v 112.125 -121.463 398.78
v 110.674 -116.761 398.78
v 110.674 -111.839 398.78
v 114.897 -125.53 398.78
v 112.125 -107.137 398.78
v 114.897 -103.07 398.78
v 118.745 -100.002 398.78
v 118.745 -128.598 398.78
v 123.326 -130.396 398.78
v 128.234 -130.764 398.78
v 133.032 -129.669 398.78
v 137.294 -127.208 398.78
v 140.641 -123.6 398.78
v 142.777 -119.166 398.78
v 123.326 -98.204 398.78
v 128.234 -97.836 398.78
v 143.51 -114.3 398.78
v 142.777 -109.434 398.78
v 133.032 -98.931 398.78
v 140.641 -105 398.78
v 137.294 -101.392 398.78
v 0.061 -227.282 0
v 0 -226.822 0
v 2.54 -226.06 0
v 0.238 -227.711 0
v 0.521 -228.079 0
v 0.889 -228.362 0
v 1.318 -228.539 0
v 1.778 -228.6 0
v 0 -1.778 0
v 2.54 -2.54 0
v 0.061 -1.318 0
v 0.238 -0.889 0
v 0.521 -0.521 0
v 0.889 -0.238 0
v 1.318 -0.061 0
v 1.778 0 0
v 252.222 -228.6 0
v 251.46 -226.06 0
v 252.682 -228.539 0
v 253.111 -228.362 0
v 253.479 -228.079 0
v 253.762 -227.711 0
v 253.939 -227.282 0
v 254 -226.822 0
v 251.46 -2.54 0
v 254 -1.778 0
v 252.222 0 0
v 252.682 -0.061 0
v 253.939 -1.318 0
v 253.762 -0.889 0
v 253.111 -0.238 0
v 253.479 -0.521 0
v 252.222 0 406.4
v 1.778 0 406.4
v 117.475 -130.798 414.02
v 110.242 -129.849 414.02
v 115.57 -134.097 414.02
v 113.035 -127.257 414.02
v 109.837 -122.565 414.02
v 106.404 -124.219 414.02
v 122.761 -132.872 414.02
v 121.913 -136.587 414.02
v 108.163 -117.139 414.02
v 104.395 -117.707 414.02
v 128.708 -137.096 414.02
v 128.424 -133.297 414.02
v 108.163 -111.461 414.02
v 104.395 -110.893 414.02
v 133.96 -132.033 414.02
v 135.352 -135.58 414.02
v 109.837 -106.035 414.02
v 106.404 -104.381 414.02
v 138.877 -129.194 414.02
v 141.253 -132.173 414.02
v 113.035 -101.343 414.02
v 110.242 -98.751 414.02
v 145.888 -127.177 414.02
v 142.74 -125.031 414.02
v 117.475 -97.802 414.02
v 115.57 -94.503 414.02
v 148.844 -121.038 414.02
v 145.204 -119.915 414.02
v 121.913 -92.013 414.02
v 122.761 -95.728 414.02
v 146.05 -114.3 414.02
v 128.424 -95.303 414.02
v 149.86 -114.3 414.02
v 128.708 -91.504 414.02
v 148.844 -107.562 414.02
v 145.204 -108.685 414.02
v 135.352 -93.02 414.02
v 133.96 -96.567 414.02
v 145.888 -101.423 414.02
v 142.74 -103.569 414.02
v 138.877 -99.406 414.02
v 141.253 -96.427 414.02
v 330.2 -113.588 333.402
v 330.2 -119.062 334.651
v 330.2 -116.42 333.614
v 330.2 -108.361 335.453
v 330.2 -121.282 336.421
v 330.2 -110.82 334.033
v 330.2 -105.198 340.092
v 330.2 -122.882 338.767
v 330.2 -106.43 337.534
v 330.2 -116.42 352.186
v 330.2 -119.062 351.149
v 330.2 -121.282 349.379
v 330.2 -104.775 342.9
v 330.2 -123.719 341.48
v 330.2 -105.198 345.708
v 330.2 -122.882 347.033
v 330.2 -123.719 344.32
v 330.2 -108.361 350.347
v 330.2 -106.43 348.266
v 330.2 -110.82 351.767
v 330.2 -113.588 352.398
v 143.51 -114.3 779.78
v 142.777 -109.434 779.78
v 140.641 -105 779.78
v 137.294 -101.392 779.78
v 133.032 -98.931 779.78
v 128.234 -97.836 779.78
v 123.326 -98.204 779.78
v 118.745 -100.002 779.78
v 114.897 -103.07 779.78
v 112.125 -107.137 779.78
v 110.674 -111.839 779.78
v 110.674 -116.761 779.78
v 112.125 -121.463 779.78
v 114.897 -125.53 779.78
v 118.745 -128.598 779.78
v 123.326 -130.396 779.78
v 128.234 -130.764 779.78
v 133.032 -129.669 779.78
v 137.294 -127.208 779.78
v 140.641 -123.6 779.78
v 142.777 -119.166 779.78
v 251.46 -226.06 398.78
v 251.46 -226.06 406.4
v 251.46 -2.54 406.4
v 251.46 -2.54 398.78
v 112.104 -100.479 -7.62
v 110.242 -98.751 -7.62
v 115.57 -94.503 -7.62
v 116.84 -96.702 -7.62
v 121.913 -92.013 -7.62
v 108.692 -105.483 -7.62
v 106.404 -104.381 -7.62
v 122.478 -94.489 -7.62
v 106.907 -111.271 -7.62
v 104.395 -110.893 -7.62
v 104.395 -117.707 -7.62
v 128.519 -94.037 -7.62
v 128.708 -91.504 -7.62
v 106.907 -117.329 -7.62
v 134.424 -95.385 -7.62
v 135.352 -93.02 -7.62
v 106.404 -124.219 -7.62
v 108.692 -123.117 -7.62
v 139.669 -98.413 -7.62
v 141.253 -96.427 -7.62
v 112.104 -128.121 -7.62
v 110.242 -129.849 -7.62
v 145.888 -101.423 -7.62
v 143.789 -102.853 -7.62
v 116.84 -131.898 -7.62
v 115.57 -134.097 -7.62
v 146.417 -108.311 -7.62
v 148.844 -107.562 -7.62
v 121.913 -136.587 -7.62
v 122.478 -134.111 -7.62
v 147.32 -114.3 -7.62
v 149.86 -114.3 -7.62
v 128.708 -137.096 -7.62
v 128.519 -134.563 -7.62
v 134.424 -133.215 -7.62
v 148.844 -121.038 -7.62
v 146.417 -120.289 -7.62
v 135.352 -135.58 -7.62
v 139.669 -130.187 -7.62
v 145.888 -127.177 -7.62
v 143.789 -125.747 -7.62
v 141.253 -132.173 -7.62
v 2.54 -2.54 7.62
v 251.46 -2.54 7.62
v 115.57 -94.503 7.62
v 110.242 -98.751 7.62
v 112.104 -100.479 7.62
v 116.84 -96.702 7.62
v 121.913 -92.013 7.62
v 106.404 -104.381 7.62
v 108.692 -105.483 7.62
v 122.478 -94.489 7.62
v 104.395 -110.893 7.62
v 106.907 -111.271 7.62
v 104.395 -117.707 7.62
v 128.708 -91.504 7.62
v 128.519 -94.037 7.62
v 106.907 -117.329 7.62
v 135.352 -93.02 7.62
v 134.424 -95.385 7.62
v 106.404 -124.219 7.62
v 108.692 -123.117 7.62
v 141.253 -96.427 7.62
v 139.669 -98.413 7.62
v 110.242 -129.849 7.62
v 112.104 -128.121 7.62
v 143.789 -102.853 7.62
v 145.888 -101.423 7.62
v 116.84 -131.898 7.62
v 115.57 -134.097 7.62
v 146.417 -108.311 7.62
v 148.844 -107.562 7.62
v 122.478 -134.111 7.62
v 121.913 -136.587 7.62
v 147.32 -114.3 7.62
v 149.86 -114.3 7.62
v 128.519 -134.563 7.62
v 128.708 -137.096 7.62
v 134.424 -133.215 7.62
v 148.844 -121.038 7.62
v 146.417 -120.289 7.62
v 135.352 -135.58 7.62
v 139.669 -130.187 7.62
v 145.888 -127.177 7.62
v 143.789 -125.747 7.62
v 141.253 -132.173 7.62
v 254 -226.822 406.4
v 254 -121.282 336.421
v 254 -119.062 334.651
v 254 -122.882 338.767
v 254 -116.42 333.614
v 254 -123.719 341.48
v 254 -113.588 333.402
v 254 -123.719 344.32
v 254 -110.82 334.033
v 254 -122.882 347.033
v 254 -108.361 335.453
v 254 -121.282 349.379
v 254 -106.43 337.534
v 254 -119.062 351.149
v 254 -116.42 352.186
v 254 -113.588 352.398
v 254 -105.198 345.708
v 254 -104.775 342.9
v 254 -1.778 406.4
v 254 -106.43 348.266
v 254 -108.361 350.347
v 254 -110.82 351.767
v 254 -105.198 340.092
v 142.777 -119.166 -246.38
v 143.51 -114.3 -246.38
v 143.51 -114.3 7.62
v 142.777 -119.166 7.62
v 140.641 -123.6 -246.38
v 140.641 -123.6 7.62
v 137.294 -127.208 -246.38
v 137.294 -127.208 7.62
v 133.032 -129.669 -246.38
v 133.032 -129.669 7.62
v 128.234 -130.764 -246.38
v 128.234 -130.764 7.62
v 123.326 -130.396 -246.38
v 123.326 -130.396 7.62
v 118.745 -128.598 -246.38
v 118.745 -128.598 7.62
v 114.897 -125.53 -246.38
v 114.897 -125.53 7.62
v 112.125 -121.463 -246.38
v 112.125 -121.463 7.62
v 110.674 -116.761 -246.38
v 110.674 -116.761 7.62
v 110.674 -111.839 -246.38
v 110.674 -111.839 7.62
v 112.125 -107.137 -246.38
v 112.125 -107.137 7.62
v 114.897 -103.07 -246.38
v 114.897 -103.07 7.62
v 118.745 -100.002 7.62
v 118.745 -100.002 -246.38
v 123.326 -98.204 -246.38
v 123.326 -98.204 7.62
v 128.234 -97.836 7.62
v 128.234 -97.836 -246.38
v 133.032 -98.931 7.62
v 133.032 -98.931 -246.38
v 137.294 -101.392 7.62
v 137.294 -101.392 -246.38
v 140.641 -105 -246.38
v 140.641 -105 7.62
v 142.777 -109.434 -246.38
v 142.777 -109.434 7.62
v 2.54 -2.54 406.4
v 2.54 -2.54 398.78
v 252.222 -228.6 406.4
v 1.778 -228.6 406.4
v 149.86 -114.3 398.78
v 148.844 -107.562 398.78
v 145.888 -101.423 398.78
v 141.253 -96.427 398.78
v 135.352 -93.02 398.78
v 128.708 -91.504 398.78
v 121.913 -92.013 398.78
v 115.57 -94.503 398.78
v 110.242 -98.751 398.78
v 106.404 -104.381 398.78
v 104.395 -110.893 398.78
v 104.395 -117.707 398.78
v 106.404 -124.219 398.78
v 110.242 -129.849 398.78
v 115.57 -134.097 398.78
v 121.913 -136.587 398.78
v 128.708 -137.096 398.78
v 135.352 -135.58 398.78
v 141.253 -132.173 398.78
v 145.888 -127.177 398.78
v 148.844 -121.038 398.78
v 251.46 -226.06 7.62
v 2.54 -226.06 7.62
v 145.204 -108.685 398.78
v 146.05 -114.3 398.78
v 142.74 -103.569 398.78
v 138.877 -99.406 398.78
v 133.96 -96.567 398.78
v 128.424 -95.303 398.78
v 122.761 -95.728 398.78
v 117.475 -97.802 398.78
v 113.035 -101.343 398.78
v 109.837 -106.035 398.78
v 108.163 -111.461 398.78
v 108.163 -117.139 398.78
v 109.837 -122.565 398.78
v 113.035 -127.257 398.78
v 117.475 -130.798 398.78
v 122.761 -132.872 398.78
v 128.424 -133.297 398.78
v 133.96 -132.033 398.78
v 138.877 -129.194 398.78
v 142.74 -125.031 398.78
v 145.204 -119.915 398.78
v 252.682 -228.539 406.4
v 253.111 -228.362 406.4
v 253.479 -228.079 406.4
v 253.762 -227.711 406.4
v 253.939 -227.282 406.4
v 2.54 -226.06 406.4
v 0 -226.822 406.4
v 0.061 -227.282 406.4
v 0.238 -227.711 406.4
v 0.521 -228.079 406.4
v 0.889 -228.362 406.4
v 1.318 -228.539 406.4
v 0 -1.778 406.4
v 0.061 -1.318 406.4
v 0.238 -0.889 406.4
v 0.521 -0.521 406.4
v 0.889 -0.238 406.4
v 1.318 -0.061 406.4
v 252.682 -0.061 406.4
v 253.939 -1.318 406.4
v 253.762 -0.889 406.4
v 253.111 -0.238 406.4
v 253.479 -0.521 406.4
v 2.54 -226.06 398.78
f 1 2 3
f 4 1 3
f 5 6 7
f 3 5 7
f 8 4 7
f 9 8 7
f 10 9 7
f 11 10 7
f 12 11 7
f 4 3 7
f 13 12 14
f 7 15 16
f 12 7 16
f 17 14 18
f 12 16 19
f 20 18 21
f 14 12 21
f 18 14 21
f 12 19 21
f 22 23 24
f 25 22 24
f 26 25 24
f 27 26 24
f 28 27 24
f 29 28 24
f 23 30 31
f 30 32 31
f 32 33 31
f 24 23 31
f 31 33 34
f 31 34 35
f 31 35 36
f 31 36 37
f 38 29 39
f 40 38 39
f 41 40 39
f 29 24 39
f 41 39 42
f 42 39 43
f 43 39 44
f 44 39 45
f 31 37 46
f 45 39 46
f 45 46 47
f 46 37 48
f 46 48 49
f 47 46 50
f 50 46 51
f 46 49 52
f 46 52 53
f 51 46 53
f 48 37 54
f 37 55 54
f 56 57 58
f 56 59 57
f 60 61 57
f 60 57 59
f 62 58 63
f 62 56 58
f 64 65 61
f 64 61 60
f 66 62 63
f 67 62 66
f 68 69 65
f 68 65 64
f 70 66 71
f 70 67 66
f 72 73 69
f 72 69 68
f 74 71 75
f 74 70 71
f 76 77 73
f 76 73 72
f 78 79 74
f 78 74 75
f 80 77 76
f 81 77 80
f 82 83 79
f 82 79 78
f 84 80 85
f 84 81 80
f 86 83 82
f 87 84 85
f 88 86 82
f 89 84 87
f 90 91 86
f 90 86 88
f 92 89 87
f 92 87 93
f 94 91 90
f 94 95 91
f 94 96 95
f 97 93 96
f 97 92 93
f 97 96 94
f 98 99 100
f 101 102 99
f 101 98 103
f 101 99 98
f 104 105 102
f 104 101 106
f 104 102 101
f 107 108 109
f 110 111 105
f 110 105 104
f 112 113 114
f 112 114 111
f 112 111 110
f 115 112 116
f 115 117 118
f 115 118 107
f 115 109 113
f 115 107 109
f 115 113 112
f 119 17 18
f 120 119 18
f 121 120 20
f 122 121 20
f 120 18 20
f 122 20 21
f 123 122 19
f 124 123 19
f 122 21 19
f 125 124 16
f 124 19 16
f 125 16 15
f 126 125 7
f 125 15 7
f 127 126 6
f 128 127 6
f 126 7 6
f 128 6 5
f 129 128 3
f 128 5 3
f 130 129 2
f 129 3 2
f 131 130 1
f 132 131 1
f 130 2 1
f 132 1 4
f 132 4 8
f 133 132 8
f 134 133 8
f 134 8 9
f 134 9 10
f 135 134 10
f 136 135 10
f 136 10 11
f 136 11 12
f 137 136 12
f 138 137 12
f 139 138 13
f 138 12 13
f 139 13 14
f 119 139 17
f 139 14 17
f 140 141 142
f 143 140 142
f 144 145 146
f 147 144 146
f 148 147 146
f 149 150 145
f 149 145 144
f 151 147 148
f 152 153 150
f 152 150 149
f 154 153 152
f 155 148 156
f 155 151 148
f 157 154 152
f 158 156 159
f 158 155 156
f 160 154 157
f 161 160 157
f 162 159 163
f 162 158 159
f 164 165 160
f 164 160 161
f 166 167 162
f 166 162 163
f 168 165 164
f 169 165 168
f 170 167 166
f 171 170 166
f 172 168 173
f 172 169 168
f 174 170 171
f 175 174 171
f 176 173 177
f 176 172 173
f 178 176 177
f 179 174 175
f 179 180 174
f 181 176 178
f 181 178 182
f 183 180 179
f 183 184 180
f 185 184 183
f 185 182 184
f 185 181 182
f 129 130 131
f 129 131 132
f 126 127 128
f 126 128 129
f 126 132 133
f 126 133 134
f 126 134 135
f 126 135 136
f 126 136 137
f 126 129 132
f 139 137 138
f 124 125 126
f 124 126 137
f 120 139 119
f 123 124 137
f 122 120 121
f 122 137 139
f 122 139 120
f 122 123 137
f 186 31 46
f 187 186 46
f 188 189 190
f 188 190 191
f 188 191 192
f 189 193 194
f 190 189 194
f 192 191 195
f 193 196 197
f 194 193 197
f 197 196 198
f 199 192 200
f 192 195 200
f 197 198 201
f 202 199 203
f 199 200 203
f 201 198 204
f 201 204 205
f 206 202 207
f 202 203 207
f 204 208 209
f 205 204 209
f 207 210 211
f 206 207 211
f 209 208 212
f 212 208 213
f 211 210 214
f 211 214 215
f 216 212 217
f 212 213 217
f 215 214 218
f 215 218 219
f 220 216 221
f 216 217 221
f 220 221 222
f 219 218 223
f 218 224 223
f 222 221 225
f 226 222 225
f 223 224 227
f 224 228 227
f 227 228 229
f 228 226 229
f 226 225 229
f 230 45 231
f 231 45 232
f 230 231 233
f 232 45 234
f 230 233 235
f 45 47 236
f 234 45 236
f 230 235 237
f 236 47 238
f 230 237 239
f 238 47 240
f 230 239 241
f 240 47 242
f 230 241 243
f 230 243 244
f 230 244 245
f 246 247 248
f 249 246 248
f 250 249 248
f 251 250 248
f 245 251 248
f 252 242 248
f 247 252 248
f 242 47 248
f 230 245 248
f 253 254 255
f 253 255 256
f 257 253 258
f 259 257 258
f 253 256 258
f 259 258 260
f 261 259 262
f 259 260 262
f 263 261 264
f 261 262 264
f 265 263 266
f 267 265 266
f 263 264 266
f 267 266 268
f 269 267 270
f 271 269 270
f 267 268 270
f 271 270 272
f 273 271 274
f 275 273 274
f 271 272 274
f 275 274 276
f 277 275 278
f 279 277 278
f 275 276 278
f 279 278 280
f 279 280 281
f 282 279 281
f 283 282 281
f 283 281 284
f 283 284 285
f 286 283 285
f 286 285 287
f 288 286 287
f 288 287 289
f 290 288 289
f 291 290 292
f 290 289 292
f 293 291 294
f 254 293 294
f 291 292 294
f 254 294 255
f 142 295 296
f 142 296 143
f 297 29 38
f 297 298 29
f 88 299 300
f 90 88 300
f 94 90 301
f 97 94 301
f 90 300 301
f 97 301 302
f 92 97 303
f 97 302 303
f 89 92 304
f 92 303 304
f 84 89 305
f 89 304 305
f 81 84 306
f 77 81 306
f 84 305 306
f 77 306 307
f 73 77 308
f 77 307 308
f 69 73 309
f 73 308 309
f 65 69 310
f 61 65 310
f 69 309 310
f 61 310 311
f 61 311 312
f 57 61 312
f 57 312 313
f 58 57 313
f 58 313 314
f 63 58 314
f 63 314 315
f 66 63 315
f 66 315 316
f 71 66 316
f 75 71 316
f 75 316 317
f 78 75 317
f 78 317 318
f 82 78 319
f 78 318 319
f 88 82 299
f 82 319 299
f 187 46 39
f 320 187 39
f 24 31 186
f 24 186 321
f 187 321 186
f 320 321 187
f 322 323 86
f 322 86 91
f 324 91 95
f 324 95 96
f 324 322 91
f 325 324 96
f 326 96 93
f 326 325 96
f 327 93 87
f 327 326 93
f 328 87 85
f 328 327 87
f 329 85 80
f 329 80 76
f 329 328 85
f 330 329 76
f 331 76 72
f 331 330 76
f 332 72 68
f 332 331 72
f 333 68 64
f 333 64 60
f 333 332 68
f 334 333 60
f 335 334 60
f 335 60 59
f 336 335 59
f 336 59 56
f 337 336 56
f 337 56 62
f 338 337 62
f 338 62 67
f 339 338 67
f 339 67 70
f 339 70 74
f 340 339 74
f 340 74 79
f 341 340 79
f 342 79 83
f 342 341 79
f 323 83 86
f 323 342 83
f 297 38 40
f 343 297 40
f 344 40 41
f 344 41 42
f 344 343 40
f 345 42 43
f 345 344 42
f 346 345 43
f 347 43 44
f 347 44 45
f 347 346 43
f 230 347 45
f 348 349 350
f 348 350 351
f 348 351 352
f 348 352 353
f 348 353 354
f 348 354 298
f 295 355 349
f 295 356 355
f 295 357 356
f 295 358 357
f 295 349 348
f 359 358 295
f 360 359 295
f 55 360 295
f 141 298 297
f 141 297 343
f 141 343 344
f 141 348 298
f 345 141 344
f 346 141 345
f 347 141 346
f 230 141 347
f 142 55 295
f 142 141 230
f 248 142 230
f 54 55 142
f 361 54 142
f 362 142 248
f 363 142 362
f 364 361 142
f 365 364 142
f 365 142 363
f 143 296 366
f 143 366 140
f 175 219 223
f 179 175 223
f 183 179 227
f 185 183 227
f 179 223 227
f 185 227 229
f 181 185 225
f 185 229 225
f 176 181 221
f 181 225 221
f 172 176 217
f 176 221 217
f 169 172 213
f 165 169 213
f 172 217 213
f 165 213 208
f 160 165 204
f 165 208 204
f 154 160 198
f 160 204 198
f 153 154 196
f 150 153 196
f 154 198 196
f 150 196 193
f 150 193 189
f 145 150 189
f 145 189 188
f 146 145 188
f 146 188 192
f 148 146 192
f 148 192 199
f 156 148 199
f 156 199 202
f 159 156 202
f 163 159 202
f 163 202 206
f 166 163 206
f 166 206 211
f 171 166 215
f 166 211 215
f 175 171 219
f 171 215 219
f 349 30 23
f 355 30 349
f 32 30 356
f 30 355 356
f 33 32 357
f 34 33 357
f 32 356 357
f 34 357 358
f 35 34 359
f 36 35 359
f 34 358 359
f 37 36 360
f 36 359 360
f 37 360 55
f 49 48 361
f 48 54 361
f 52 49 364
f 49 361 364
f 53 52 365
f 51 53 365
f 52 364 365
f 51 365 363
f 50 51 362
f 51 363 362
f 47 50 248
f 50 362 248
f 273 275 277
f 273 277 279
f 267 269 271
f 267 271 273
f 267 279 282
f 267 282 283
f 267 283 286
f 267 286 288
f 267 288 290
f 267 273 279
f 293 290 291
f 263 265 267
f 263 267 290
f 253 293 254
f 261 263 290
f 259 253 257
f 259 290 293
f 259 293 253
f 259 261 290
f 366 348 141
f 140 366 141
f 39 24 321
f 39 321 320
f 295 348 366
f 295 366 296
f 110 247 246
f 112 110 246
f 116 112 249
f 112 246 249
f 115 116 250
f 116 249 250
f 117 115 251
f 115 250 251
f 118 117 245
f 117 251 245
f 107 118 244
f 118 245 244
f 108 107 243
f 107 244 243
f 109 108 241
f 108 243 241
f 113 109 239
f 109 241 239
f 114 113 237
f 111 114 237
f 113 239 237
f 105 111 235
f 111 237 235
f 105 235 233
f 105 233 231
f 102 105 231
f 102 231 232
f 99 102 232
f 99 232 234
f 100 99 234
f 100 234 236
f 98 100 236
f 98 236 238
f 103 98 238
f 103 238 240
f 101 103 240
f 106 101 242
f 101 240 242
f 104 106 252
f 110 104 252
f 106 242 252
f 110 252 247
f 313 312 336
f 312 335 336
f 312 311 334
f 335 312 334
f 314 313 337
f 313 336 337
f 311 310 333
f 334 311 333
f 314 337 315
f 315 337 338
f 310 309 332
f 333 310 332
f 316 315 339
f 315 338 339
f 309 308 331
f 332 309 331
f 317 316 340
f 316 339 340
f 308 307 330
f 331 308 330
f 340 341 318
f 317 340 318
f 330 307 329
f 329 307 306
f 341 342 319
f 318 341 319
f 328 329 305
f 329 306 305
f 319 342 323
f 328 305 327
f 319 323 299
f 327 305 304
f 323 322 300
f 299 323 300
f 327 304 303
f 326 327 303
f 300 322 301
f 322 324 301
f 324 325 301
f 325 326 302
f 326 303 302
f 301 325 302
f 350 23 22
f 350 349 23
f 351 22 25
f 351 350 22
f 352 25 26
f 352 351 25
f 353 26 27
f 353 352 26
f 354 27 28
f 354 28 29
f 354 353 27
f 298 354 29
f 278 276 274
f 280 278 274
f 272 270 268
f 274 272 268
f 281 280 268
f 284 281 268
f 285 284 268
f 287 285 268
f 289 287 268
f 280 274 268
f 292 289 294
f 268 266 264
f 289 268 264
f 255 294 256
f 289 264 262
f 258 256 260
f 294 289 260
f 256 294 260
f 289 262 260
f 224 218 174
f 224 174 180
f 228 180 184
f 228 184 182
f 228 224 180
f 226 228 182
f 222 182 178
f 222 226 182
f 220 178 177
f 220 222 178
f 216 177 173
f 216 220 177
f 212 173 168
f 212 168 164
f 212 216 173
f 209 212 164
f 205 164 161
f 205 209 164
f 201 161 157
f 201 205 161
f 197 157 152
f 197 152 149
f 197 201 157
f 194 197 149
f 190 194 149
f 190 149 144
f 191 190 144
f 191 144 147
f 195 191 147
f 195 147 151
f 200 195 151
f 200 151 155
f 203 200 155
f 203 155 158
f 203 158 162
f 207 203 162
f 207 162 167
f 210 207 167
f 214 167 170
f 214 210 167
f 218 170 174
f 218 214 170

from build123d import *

# Parameters (mm, degrees)
F0_W      = 254
F0_H      = 406.4
F1_DEPTH  = 228.6
F2_W      = 248.92
F2_H      = 223.52
F3_DEPTH  = 7.62
F4_W      = 248.92
F4_H      = 223.52
F5_DEPTH  = 7.62
F6_R      = 22.86
F6_R_2    = 20.32
F7_DEPTH  = 15.24
F8_R      = 16.51
F9_DEPTH  = 254
F10_R     = 1.778
F11_R     = 22.86
F11_R_2   = 19.05
F12_DEPTH = 15.24
F13_R     = 16.51
F14_DEPTH = 381
F15_R     = 9.525
F16_DEPTH = 76.2


with BuildPart() as f1:
    # F0 (on Front) → F1 (new body)
    with BuildSketch(Plane.XZ):
        with Locations((127, 203.2)):
            Rectangle(F0_W, F0_H)
    extrude(amount=F1_DEPTH)

    # F2 (on face) → F3 (cut)
    with BuildSketch(Plane.XY.offset(406.4)):
        with Locations((127, -114.3)):
            Rectangle(F2_W, F2_H)
    extrude(amount=-F3_DEPTH, mode=Mode.SUBTRACT)

    # F4 (on face) → F5 (cut)
    with BuildSketch(Plane(origin=(0, 0, 0), x_dir=(1, 0, 0), z_dir=(0, 0, -1))):
        with Locations((127, 114.3)):
            Rectangle(F4_W, F4_H)
    extrude(amount=-F5_DEPTH, mode=Mode.SUBTRACT)

    # F10
    f10_edges = [f1.edges().sort_by_distance(p)[0] for p in [
        (0, -228.6, 203.2),
        (0, 0, 203.2),
        (254, -228.6, 203.2),
        (254, 0, 203.2),
    ]]
    fillet(f10_edges, radius=F10_R)

    # F15 (on face) → F16 (join)
    with BuildSketch(Plane.YZ.offset(254)):
        with Locations((-114.3, 342.9)):
            Circle(F15_R)
    extrude(amount=F16_DEPTH)


with BuildPart() as f7:
    # F6 (on face) → F7 (new body)
    with BuildSketch(Plane(origin=(0, 0, 7.62), x_dir=(1, 0, 0), z_dir=(0, 0, -1))):
        with Locations((127, 114.3)):
            Circle(F6_R)
        with Locations((127, 114.3)):
            Circle(F6_R_2, mode=Mode.SUBTRACT)
    extrude(amount=F7_DEPTH)


with BuildPart() as f9:
    # F8 (on face) → F9 (new body)
    with BuildSketch(Plane(origin=(0, 0, 7.62), x_dir=(1, 0, 0), z_dir=(0, 0, -1))):
        with Locations((127, 114.3)):
            Circle(F8_R)
    extrude(amount=F9_DEPTH)


with BuildPart() as f12:
    # F11 (on face) → F12 (new body)
    with BuildSketch(Plane.XY.offset(398.78)):
        with Locations((127, -114.3)):
            Circle(F11_R)
        with Locations((127, -114.3)):
            Circle(F11_R_2, mode=Mode.SUBTRACT)
    extrude(amount=F12_DEPTH)


with BuildPart() as f14:
    # F13 (on face) → F14 (new body)
    with BuildSketch(Plane.XY.offset(398.78)):
        with Locations((127, -114.3)):
            Circle(F13_R)
    extrude(amount=F14_DEPTH)


solid = Compound([f1.part, f7.part, f9.part, f12.part, f14.part])
